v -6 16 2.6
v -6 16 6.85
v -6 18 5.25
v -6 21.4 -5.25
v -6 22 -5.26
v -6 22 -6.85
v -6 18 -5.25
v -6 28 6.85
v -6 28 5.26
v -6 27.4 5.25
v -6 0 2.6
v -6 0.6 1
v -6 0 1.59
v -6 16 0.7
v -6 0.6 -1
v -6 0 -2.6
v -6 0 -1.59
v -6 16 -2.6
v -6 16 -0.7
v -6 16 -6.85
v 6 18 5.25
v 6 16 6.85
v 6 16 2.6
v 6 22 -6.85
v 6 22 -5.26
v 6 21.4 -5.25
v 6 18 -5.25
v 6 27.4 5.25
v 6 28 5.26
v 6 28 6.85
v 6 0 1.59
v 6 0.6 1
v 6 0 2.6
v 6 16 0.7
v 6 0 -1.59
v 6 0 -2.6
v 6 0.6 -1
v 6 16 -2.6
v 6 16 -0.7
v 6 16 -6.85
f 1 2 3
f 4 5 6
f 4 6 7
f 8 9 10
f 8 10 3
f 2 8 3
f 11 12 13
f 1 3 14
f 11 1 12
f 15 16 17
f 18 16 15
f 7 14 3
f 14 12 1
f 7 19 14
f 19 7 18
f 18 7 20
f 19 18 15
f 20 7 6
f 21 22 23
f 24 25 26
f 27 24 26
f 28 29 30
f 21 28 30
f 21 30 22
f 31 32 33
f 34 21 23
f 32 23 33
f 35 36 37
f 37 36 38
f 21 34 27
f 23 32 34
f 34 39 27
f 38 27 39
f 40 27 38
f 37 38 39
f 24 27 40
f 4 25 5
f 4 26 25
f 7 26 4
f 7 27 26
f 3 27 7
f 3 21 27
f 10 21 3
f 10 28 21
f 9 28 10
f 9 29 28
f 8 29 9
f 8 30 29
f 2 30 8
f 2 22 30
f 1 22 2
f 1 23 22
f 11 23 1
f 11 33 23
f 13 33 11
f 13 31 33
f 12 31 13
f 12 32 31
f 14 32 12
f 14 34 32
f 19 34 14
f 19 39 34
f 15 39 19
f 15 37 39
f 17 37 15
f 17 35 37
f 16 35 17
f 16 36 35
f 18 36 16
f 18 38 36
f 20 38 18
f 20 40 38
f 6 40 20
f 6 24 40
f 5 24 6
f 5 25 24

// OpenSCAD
// BSidesTLV 2026 badge — mini clips
//
// Two small clips, one on each side of the USB-C plug. Each pinches the
// board's edge in a U channel and puts a flat foot with two lips on the
// phone's bottom edge, in the gap the seated plug leaves. The foot stops the
// board tilting toward the screen or the back, which is what rocks the plug
// in the port. Both clips are the same part.
//
// On the badge as built the board is centred on the plug's axis (measured on
// a printed clip: the board runs through the middle of the foot), so the
// channel is at Z = board_z = 0. part = "gauge" prints a comb of slots at
// known offsets (-3.8, 0, 3.8; "gauge_b" -1.9, 1.9) to check that on a new
// board revision in two prints.
//
// Frame: X across the phone, Y up (toward the phone), Z through the phone,
// +Z = the phone's back. Z = 0 is the plug's axis. X = 0 is the clip's own centre; the two clips sit
// at X = +/- clip_x on the badge.
//
// Numbers come from PhoneController.kicad_pcb (board 1.6 mm, the stem's top
// edge within 2 mm of the tip for 15 mm either side of the plug, no parts
// within 29 mm of the tip) and the Hanbo TC-002 drawing (plug housing 10.10
// wide, 11.25 mm past the board edge, 0.27 mm stand-off).
//
// Print: on its side (the 8 mm width up), no supports, every wall vertical.
// PETG preferred, PLA fine. 0.2 mm layers. ~0.6 g, a few minutes; dozens
// per plate.
//
//   openscad -o badge-clip-10.5.stl -D 'part="print"' -D phone_t=10.5 badge-clip.scad

part = "clip";       // "clip" | "assembly" | "section" | "print" | "gauge" | "gauge_b"
board_z   = 0;       // the board's mid-plane from the plug's axis (+ = toward the phone's back)
gauge_z   = [-3.8, 0, 3.8];   // the gauge's slots (gauge_b = [-1.9, 1.9]); at least slot_w + wall_t apart

// ---- the phone ---------------------------------------------------------
phone_t   = 10.5;    // [7:0.5:14] thickness of the phone (with its case) between the lips
lip_t     = 1.6;     // thickness of the lips
lip_front = 4;       // how far the lip reaches up the screen side (the chin)
lip_back  = 10;      // ... and up the back: the lever that stops the tilt

// ---- the badge ---------------------------------------------------------
pcb_t     = 1.6;
pcb_clear = 0.4;     // slot width over the board at the mouth
pinch     = 0.6;     // the slot narrows by this toward its roof: the walls spring and clamp
clip_w    = 12;      // width of each clip along the board edge
clip_x    = 12;      // centre of each clip from the plug (housing is 10.1 wide)
chan_d    = 16;      // depth of the U channel onto the board: the lever on the board side
wall_t    = 1.6;     // the channel's walls
bridge    = 2.0;     // channel roof to the foot's top. The clip slides on the board, so any
                     // gap from the board's edge to the phone's edge >= this works
tip_gap   = 4.3;     // board edge to phone edge when the plug is seated, bare phone

chamfer = 0.6;
$fn = 24;

// derived: Y = 0 at the slot mouth, the board's edge rises into the channel
slot_w = pcb_t + pcb_clear;                   // slot width at the mouth
foot_y = chan_d + bridge;                     // the foot's top, where the phone sits
foot_t = bridge;                              // the foot is the bridge plate itself
z_f0 = -phone_t / 2 - lip_t;
z_f1 =  phone_t / 2 + lip_t;
eps = 0.01;

module profile(slots = [board_z]) {   // in YZ: [y, z]; slots = the channels' centres in Z
  if (len(slots) > 1) for (i = [1 : 1 : len(slots) - 1])
    assert(slots[i] - slots[i - 1] >= slot_w + wall_t, "slots too close: they would merge");
  z_out0 = min(slots) - slot_w / 2 - wall_t;
  z_out1 = max(slots) + slot_w / 2 + wall_t;
  difference() {
    polygon([[0, z_out0], [foot_y - foot_t, z_out0], [foot_y - foot_t, z_f0],
             [foot_y + lip_front, z_f0], [foot_y + lip_front, z_f0 + lip_t], [foot_y, z_f0 + lip_t],
             [foot_y, z_f1 - lip_t], [foot_y + lip_back, z_f1 - lip_t], [foot_y + lip_back, z_f1],
             [foot_y - foot_t, z_f1], [foot_y - foot_t, z_out1], [0, z_out1]]);
    // the slots, narrowing toward the roof, with a lead-in at the mouth
    for (c = slots) let (z0 = c - slot_w / 2, z1 = c + slot_w / 2)
      polygon([[-eps, z0 - chamfer], [chamfer, z0], [chan_d, z0 + pinch / 2],
               [chan_d, z1 - pinch / 2], [chamfer, z1], [-eps, z1 + chamfer]]);
    // lead-ins on the lips
    polygon([[foot_y + lip_front + eps, z_f0 + lip_t + chamfer], [foot_y + lip_front - chamfer, z_f0 + lip_t],
             [foot_y + lip_front + eps, z_f0 + lip_t - eps]]);
    polygon([[foot_y + lip_back + eps, z_f1 - lip_t - chamfer], [foot_y + lip_back - chamfer, z_f1 - lip_t],
             [foot_y + lip_back + eps, z_f1 - lip_t + eps]]);
  }
}

module clip(slots = [board_z]) {
  rotate([90, 0, 90]) translate([0, 0, -clip_w / 2]) linear_extrude(clip_w) profile(slots);
}

// ---- the other parts, for the pictures ---------------------------------
include <board-outline.scad>
pcb_front = board_z - pcb_t / 2;
pcb_back  = board_z + pcb_t / 2;

module board() {
  color("#1d3b2a") translate([0, 0, pcb_front]) linear_extrude(pcb_t) polygon(BOARD_OUTLINE);
  color("silver") {
    translate([-10.1 / 2, -2.3, -1.6]) cube([10.1, 2.3 + 1.2, 3.2]);
    translate([-8.25 / 2, 1.2, -1.2]) cube([8.25, 10.07, 2.4]);
  }
}

module phone() {
  color("#2b2b33", 0.9) difference() {
    translate([-36, 0, -phone_t / 2]) cube([72, 150, phone_t]);
    translate([-4.5, -eps, -1.4]) cube([9, 7, 2.8]);
    translate([-33, 4, -phone_t / 2 - eps]) cube([66, 140, 0.4]);
  }
}

module half() { intersection() { children(); translate([-100, -60, -50]) cube([100, 200, 100]); } }

// on the badge the board's tip is at Y = 0 and the phone's edge at Y = tip_gap;
// each clip hangs from the phone's edge, its slot roof a little above the board's edge
clip_y = tip_gap - foot_y;

if (part == "clip") clip();
if (part == "print") rotate([0, -90, 0]) translate([-clip_w / 2, 0, 0]) clip();
if (part == "gauge") rotate([0, -90, 0]) translate([-clip_w / 2, 0, 0]) clip(gauge_z);
if (part == "gauge_b") rotate([0, -90, 0]) translate([-clip_w / 2, 0, 0]) clip([-1.9, 1.9]);
if (part == "assembly") {
  for (s = [-1, 1]) color("#c8e64a") translate([s * clip_x, clip_y, 0]) clip();
  board();
  translate([0, tip_gap, 0]) phone();
}
if (part == "section") {
  color("#c8e64a") half() translate([clip_x, clip_y, 0]) clip();
  half() translate([clip_x, 0, 0]) board();
  half() translate([clip_x, tip_gap, 0]) phone();
}
